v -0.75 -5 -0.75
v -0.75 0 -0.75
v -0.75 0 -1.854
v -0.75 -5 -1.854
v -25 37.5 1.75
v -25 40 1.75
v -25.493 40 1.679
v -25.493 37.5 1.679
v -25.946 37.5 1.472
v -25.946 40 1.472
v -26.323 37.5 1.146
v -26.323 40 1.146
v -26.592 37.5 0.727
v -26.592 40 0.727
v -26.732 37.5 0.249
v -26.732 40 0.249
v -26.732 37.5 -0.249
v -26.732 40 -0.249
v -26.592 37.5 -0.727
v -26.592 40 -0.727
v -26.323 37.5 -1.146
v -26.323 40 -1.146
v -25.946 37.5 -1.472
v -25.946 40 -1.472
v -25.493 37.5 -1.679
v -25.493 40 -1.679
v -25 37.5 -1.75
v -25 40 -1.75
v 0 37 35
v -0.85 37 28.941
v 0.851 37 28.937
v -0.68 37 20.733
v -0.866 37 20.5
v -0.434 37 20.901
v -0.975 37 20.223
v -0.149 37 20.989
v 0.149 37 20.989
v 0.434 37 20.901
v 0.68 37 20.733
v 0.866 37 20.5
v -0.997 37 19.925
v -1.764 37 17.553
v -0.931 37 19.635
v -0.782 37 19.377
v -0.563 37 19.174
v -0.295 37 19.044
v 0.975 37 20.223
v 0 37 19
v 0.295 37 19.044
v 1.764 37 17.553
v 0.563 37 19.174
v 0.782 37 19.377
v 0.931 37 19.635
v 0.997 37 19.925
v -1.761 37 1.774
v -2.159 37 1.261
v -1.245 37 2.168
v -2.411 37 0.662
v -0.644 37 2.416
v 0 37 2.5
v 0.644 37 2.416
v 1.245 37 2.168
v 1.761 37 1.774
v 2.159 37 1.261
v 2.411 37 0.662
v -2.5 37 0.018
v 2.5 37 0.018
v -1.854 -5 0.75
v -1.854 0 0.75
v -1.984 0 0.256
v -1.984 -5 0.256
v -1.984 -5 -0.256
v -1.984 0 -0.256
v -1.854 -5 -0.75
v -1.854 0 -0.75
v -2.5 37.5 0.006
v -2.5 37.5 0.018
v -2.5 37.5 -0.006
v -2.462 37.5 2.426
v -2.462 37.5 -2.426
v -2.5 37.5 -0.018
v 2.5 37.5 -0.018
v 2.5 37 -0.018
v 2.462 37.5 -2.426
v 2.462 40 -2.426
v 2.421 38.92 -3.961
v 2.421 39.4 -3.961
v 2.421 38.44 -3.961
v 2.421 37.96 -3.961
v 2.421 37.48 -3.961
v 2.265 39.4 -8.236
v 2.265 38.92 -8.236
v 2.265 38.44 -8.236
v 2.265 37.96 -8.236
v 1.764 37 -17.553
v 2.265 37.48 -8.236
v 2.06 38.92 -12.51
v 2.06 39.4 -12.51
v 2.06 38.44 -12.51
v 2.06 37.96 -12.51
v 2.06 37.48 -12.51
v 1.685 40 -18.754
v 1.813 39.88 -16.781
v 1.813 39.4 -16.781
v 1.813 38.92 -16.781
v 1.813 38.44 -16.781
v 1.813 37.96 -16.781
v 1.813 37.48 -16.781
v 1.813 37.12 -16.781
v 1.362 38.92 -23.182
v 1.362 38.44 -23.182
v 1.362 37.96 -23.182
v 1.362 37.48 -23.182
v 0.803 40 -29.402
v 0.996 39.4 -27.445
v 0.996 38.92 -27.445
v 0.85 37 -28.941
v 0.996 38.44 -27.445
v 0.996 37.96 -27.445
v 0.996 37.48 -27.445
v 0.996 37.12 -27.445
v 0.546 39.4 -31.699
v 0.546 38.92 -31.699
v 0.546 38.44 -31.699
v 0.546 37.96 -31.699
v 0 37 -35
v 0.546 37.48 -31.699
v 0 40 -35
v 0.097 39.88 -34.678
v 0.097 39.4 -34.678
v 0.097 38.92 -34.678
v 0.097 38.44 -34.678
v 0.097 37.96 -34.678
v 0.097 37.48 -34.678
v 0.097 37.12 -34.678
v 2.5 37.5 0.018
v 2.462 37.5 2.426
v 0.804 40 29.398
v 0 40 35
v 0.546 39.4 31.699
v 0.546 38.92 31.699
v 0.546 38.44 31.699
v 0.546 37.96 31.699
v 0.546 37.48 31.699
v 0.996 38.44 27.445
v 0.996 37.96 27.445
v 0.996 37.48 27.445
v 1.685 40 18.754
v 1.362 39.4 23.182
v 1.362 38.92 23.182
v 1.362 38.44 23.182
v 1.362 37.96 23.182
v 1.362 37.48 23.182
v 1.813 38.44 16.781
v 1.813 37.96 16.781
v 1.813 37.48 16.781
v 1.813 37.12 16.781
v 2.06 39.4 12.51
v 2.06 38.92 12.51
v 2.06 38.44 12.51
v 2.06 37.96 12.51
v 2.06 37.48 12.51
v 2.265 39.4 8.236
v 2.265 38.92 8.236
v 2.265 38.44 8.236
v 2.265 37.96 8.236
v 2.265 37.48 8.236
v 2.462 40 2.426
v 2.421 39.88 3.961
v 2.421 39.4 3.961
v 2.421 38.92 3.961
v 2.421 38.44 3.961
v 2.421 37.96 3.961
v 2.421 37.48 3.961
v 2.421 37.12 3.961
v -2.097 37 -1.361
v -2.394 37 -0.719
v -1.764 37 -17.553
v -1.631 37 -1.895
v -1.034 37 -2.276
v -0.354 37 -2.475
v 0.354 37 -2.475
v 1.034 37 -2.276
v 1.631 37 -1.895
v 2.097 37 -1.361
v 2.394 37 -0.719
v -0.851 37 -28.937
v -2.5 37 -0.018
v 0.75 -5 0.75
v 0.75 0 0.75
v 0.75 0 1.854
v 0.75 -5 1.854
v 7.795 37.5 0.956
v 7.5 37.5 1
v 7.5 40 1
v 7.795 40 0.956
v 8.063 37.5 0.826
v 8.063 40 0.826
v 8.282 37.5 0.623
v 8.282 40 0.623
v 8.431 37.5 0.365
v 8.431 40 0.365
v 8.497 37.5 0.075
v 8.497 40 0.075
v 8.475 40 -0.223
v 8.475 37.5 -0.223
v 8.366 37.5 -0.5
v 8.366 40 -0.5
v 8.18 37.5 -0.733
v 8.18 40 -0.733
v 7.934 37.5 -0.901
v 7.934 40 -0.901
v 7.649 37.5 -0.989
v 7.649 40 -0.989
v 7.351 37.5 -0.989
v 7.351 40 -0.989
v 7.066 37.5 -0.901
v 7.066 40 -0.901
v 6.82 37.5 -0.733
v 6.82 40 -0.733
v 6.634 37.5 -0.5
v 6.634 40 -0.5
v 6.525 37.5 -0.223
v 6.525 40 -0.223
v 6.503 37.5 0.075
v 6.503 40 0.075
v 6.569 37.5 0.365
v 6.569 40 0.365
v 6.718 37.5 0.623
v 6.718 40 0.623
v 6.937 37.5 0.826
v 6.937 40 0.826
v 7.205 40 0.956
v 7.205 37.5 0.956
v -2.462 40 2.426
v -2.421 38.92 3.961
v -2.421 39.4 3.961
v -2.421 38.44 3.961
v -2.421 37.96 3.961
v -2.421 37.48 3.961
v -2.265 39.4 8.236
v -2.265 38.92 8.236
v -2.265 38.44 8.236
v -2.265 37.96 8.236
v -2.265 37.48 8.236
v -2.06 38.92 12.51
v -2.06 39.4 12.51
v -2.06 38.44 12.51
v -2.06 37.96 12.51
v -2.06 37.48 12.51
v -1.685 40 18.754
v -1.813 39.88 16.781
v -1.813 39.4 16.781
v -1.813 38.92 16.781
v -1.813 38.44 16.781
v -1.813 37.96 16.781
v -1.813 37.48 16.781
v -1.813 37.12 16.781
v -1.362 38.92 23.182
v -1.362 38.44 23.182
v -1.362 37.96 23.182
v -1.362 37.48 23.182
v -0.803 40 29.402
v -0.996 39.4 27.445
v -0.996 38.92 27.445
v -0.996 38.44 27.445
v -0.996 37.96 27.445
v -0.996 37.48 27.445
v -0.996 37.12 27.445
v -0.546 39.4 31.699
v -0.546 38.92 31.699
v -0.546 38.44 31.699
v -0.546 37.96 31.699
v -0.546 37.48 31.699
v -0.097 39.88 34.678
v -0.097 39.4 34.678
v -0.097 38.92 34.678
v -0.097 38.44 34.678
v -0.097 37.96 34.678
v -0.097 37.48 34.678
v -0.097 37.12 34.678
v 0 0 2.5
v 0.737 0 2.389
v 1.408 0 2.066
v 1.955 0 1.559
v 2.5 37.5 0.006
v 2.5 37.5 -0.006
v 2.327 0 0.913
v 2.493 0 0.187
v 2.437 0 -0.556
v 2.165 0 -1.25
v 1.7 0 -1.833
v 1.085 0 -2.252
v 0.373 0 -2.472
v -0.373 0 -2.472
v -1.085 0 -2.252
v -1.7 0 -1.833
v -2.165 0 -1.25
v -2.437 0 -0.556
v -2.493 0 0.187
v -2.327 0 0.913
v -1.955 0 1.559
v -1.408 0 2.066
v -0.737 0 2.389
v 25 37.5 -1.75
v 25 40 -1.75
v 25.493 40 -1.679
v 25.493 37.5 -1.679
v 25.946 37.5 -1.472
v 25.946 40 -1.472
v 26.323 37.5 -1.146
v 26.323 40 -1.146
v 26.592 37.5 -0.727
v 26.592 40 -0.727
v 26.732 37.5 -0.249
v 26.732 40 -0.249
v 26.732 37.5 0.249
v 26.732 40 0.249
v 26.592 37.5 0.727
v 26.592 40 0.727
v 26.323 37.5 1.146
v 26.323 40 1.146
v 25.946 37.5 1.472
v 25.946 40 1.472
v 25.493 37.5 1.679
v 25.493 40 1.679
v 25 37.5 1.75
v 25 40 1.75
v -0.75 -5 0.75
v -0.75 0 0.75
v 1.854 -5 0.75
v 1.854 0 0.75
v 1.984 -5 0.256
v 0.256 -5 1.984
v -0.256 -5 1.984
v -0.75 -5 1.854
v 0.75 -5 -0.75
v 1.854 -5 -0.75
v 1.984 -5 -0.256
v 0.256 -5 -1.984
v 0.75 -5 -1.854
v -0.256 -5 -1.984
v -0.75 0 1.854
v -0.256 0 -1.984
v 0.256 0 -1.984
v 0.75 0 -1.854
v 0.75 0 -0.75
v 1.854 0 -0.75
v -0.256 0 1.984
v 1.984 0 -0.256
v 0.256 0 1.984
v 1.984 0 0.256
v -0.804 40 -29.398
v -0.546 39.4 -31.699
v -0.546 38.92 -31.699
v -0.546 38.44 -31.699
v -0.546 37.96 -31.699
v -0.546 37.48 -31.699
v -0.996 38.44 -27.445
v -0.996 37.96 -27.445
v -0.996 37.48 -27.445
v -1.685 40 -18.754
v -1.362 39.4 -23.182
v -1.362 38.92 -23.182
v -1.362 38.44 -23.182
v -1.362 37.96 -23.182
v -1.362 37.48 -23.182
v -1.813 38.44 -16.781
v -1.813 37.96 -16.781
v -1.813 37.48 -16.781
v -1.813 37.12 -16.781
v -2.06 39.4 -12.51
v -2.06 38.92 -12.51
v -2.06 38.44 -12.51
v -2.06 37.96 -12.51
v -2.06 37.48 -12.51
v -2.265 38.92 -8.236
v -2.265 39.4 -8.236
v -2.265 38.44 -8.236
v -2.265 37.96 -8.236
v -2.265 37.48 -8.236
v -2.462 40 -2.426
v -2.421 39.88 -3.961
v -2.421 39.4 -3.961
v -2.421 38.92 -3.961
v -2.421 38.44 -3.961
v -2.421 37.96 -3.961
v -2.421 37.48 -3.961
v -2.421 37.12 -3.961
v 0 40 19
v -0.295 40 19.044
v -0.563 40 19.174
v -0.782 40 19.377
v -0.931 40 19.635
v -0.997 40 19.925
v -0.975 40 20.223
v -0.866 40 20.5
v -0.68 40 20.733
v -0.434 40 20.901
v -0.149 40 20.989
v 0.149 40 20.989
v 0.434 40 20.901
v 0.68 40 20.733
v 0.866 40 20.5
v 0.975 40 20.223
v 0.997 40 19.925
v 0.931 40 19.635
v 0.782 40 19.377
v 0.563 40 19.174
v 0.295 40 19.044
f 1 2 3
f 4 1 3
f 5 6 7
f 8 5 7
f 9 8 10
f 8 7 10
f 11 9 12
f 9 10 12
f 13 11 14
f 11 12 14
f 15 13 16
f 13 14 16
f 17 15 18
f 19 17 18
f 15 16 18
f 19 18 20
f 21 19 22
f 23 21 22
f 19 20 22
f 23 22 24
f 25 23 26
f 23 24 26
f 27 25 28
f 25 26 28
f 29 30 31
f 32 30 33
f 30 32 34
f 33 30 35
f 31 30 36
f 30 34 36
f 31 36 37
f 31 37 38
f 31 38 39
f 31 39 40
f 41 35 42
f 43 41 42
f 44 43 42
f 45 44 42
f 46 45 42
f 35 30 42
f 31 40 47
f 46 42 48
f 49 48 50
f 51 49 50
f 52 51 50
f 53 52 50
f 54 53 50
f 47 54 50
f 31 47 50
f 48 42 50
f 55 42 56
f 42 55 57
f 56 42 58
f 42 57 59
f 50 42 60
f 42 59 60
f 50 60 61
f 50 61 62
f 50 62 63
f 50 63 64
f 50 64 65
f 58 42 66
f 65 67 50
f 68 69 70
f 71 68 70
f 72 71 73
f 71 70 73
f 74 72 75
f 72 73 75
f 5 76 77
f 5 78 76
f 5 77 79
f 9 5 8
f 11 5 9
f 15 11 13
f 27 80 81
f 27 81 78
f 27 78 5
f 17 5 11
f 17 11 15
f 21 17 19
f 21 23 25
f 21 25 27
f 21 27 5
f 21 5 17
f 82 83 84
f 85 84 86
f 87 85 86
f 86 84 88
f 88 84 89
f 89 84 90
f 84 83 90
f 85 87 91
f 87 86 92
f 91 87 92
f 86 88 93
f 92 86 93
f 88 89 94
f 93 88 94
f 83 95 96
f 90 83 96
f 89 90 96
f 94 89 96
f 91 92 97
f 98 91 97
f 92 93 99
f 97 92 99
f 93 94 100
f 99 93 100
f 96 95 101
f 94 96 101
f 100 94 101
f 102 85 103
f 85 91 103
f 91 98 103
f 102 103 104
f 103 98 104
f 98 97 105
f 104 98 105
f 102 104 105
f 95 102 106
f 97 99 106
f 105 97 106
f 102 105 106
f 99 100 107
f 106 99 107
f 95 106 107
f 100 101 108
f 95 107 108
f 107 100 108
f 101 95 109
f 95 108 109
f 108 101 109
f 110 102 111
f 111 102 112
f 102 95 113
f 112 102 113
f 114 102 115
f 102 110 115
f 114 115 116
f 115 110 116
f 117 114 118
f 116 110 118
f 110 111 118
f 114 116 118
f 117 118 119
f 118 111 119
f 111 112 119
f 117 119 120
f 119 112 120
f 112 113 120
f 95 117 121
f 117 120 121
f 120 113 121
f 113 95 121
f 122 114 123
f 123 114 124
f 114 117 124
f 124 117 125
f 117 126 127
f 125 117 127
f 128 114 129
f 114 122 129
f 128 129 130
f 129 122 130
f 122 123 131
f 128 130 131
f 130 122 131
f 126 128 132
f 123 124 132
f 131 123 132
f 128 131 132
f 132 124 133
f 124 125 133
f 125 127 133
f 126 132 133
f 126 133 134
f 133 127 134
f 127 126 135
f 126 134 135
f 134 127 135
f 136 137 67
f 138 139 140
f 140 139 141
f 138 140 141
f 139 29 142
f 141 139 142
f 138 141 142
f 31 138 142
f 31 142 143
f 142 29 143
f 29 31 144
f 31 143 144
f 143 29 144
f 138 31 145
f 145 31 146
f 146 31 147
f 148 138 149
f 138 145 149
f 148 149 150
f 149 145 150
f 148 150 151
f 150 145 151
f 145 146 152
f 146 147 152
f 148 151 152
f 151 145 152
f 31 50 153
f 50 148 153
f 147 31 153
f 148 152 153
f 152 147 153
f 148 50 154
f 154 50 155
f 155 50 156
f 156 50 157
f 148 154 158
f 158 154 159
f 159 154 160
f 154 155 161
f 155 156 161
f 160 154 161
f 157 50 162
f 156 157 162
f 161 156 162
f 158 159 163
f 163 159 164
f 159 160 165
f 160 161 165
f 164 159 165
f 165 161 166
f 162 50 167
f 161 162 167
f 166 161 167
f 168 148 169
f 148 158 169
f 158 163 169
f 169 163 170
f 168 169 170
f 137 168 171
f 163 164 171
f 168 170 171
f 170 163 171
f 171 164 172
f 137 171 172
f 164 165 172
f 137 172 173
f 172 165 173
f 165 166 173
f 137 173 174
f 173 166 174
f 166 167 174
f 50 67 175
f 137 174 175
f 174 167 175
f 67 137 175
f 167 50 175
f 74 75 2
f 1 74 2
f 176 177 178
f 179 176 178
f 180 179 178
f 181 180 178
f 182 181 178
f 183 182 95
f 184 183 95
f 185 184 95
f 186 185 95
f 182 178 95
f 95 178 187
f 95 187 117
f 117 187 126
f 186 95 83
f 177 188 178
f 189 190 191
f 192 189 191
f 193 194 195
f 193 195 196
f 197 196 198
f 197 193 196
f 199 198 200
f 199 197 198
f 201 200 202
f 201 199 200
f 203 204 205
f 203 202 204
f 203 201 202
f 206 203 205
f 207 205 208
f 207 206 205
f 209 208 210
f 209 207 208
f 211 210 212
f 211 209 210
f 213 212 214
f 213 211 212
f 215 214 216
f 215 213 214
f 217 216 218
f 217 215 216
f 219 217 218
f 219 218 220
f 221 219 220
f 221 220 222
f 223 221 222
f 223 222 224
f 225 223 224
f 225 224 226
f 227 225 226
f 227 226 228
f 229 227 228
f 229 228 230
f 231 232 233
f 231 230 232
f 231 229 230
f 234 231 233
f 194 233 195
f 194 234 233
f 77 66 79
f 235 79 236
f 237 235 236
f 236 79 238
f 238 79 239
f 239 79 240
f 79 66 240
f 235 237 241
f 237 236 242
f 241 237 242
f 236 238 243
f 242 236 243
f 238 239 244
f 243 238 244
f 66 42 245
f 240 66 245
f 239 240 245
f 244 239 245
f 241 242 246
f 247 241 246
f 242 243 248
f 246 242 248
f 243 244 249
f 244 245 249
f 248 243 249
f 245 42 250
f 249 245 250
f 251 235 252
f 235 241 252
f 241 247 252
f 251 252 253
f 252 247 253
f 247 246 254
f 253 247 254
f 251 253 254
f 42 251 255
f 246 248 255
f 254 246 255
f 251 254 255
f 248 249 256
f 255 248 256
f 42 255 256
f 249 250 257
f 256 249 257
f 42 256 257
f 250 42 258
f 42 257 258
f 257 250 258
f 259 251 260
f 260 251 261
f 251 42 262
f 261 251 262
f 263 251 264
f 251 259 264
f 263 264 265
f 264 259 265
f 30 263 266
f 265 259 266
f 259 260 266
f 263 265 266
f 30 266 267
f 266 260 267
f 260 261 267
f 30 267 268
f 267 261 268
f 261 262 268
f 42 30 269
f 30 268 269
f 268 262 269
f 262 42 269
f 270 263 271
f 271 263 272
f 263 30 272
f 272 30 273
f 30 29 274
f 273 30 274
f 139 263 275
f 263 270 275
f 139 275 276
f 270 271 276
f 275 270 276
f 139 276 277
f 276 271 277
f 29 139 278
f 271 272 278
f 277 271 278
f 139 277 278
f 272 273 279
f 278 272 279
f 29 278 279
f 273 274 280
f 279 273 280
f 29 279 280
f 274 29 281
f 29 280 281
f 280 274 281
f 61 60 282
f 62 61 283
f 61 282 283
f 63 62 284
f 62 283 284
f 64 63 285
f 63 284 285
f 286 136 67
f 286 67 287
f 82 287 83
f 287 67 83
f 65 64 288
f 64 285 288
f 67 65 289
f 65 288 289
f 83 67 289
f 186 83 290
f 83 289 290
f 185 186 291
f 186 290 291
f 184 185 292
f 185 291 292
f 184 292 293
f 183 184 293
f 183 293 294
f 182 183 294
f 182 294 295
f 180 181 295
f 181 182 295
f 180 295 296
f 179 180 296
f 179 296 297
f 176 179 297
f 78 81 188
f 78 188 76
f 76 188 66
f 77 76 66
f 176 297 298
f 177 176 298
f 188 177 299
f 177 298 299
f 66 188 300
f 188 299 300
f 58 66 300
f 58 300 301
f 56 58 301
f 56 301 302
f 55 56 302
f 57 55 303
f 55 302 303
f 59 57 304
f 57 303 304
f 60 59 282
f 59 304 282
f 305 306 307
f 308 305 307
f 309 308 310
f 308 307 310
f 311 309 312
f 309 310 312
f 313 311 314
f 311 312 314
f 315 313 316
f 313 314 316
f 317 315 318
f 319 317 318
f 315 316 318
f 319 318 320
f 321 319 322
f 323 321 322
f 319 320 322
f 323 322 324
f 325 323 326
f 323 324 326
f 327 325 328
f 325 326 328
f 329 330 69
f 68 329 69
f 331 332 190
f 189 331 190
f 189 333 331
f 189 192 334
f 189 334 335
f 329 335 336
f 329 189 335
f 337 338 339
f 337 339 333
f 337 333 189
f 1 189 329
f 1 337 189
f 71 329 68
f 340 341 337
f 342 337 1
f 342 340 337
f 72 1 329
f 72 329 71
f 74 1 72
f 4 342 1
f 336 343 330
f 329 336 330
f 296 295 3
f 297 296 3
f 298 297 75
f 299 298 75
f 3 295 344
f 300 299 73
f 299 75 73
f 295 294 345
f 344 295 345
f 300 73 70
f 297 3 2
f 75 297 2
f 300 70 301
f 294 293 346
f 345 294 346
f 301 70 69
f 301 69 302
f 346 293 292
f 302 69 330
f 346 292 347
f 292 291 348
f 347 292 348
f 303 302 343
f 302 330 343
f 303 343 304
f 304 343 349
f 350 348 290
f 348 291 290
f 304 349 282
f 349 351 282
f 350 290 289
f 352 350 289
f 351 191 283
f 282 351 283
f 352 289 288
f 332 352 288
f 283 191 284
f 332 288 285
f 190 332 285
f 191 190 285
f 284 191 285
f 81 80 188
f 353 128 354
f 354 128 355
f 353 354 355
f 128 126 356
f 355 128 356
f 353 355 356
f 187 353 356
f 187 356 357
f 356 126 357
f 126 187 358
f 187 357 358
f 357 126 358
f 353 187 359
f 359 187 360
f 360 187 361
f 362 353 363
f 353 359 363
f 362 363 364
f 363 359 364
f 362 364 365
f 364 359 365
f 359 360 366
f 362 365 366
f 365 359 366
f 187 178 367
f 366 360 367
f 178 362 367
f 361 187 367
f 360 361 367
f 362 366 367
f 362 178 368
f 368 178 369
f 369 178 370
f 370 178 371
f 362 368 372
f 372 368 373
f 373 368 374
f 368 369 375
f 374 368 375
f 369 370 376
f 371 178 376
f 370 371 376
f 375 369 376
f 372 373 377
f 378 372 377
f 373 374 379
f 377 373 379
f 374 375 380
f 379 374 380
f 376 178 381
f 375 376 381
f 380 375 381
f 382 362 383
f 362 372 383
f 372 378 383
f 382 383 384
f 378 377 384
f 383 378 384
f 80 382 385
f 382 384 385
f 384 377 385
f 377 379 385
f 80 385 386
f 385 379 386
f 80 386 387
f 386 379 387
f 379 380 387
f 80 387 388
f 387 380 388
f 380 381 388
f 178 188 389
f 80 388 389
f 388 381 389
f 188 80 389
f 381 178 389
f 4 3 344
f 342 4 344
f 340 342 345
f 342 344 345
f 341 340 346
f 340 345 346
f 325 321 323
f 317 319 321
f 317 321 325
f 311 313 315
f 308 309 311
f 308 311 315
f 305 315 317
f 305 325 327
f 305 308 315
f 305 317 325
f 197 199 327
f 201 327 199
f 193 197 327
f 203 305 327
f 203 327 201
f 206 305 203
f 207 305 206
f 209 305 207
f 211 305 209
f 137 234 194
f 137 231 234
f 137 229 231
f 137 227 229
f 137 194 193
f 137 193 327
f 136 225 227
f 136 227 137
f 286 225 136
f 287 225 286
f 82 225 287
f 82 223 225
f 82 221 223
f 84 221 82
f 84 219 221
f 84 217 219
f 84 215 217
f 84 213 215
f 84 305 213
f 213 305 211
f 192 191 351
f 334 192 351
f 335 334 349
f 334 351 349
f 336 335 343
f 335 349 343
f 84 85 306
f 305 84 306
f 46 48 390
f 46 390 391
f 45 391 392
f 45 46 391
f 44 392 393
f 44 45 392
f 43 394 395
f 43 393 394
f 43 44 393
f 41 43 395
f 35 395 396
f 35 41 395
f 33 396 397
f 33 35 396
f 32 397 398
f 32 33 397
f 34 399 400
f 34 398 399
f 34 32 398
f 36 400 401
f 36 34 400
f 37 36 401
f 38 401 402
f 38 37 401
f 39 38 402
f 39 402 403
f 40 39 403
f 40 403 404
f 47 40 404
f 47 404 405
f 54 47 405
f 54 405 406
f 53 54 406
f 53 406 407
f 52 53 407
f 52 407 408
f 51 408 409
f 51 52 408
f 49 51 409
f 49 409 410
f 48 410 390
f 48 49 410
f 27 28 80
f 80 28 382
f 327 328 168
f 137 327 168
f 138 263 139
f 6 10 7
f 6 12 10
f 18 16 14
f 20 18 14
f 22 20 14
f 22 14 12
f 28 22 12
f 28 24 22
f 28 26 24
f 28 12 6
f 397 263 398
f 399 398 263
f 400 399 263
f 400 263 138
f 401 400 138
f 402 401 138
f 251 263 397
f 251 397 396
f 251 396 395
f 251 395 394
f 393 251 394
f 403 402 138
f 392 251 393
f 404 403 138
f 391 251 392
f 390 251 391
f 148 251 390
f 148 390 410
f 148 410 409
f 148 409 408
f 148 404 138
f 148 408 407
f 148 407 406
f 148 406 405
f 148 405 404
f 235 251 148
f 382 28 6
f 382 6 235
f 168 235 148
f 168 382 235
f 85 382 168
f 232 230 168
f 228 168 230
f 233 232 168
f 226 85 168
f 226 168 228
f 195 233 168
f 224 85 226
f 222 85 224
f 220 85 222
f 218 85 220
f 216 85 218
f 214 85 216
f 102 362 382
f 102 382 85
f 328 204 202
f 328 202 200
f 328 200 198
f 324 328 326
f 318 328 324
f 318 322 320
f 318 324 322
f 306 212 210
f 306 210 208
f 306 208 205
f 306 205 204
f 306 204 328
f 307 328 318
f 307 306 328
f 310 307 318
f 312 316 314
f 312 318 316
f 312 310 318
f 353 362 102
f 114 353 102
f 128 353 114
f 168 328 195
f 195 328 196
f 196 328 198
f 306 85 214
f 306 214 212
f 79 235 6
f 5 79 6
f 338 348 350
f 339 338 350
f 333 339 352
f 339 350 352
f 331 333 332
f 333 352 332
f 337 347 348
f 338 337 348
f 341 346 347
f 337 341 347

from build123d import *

# Parameters (mm, degrees)
SKETCH_1_R          = 2.5
EXTRUDE_1_DEPTH     = 40
EXTRUDE_2_DEPTH     = 5
EXTRUDE_START       = 40
EXTRUDE_3_DEPTH     = 2.5
SKETCH_4_R          = 1
CUT_EXTRUDE_1_DEPTH = 49.185189633
EXTRUDE_START_2     = 37
EXTRUDE_5_DEPTH     = 3
SKETCH_6_R          = 1
CUT_EXTRUDE_2_DEPTH = 60.502626163


# Read off the part's stored shape, not the designer's step: 凸台-拉伸5
with BuildPart() as part:
    # 草图1 → 凸台-拉伸1 (new body)
    with BuildSketch(Plane(origin=(0, 0, 0), x_dir=(1, 0, 0), z_dir=(0, 1, 0))):
        with Locations(Location((0, 0, 0), (0, 0, 270))):
            Circle(SKETCH_1_R)
    extrude(amount=EXTRUDE_1_DEPTH)

    # 草图2 → 凸台-拉伸2 (add)
    with BuildSketch(Plane(origin=(0, 0, 0), x_dir=(1, 0, 0), z_dir=(0, 1, 0))):
        with BuildLine():
            Line((-1.854049622, 0.75), (-0.75, 0.75))
            Line((-0.75, 0.75), (-0.75, 1.854049622))
            ThreePointArc((-0.75, 1.854049622), (0, 2), (0.75, 1.854049622))
            Line((0.75, 1.854049622), (0.75, 0.75))
            Line((0.75, 0.75), (1.854049622, 0.75))
            ThreePointArc((1.854049622, 0.75), (2, 0), (1.854049622, -0.75))
            Line((1.854049622, -0.75), (0.75, -0.75))
            Line((0.75, -0.75), (0.75, -1.854049622))
            ThreePointArc((0.75, -1.854049622), (0, -2), (-0.75, -1.854049622))
            Line((-0.75, -1.854049622), (-0.75, -0.75))
            Line((-0.75, -0.75), (-1.854049622, -0.75))
            ThreePointArc((-1.854049622, -0.75), (-2, 0), (-1.854049622, 0.75))
        make_face()
    extrude(amount=-EXTRUDE_2_DEPTH)

    # 草图3 → 凸台-拉伸3 (add)
    with BuildSketch(Plane(origin=(0, 0, 0), x_dir=(1, 0, 0), z_dir=(0, 1, 0)).offset(EXTRUDE_START)):
        with BuildLine():
            Line((-25, 1.75), (0, 2.5))
            Line((0, 2.5), (25, 1.75))
            ThreePointArc((25, 1.75), (26.75, 0), (25, -1.75))
            Line((25, -1.75), (0, -2.5))
            Line((0, -2.5), (-25, -1.75))
            ThreePointArc((-25, -1.75), (-26.75, 0), (-25, 1.75))
        make_face()
    extrude(amount=-EXTRUDE_3_DEPTH)

    # 草图4 → 切除-拉伸1 (cut, through all)
    with BuildSketch(Plane(origin=(0, 0, 0), x_dir=(1, 0, 0), z_dir=(0, 1, 0))):
        with Locations(Location((7.5, 0, 0), (0, 0, 270))):
            Circle(SKETCH_4_R)
    extrude(amount=CUT_EXTRUDE_1_DEPTH, mode=Mode.SUBTRACT)

    # 凸台-拉伸5 outline → 凸台-拉伸5 (add)
    with BuildSketch(Plane(origin=(0, 0, 0), x_dir=(1, 0, 0), z_dir=(0, 1, 0)).offset(EXTRUDE_START_2)):
        with BuildLine():
            add(Edge.make_bspline(
                [(2.499933423, 0.018245068), (2.498219386, 0.469363251), (2.484734316, 1.455192602), (2.451884064, 2.975538514), (2.389924718, 5.030093947), (2.311185682, 7.167783743), (2.21992006, 9.304977486), (2.117504763, 11.441661138), (2.004457826, 13.577810113), (1.850297461, 16.247283269), (1.678883113, 18.915719005), (1.489506552, 21.582946653), (1.279504124, 24.248615937), (1.097348525, 26.379992466), (0.89821468, 28.50986205), (0.694476446, 30.469111551), (0.501474971, 32.108411254), (0.335275975, 33.325545367), (0.216484884, 34.069691013), (0.139328591, 34.483174612), (0.092236202, 34.701503032), (0.063236689, 34.819144825), (0.045016629, 34.88495716), (0.032864766, 34.924107989), (0.023980122, 34.950624486), (0.015550639, 34.971928448), (0.009545374, 34.986982697), (0.003698819, 34.995890501), (0, 35)],
                knots=[0.000519485, 0.000519485, 0.000519485, 0.000519485, 0.000519485, 0.051897602, 0.112804134, 0.173710667, 0.2346172, 0.295523733, 0.356430266, 0.417336798, 0.478243331, 0.600056396, 0.660962928, 0.721869461, 0.782775993, 0.843682525, 0.904589058, 0.946207229, 0.970757176, 0.983579314, 0.990404585, 0.994106837, 0.996190511, 0.99737811, 0.9981787, 0.998778686, 0.999368421, 1, 1, 1, 1, 1], degree=4))
            add(Edge.make_bspline(
                [(0, 35), (-0.003698819, 34.995890501), (-0.009545374, 34.986982697), (-0.015550639, 34.971928448), (-0.023980122, 34.950624486), (-0.032864766, 34.924107989), (-0.045016629, 34.88495716), (-0.063236689, 34.819144825), (-0.092236202, 34.701503032), (-0.139328591, 34.483174612), (-0.216484884, 34.069691013), (-0.335275975, 33.325545367), (-0.501474971, 32.108411254), (-0.694476446, 30.469111551), (-0.89821468, 28.50986205), (-1.097348525, 26.379992466), (-1.279504125, 24.248615937), (-1.489506552, 21.582946653), (-1.678883113, 18.915719005), (-1.850297461, 16.247283269), (-2.004457826, 13.577810113), (-2.117504763, 11.441661138), (-2.21992006, 9.304977486), (-2.311185682, 7.167783743), (-2.389924718, 5.030093947), (-2.451884064, 2.975538513), (-2.484734316, 1.455192601), (-2.498219387, 0.46936325), (-2.499933423, 0.018245066)],
                knots=[0, 0, 0, 0, 0, 0.000631579, 0.001221314, 0.0018213, 0.00262189, 0.003809489, 0.005893163, 0.009595415, 0.016420686, 0.029242824, 0.053792771, 0.095410942, 0.156317475, 0.217224007, 0.278130539, 0.339037072, 0.399943604, 0.521756669, 0.582663202, 0.643569734, 0.704476267, 0.7653828, 0.826289333, 0.887195866, 0.948102398, 0.999480515, 0.999480515, 0.999480515, 0.999480515, 0.999480515], degree=4))
            ThreePointArc((-2.499933423, 0.018245066), (-1e-09, 2.5), (2.499933423, 0.018245068))
        make_face()
        with BuildLine():
            ThreePointArc((2.499933423, -0.018245068), (-1e-09, -2.5), (-2.499933423, -0.018245066))
            add(Edge.make_bspline(
                [(-2.499933423, -0.018245066), (-2.498219387, -0.46936325), (-2.484734316, -1.455192601), (-2.451884064, -2.975538513), (-2.389924718, -5.030093947), (-2.311185682, -7.167783743), (-2.21992006, -9.304977486), (-2.117504763, -11.441661138), (-2.004457826, -13.577810113), (-1.850297461, -16.247283269), (-1.678883113, -18.915719005), (-1.489506552, -21.582946653), (-1.279504125, -24.248615937), (-1.097348525, -26.379992466), (-0.89821468, -28.50986205), (-0.694476446, -30.469111551), (-0.501474971, -32.108411254), (-0.335275975, -33.325545367), (-0.216484884, -34.069691013), (-0.139328591, -34.483174612), (-0.092236202, -34.701503032), (-0.063236689, -34.819144825), (-0.045016629, -34.88495716), (-0.032864766, -34.924107989), (-0.023980122, -34.950624486), (-0.015550639, -34.971928448), (-0.009545374, -34.986982697), (-0.003698819, -34.995890501), (0, -35)],
                knots=[0.000519485, 0.000519485, 0.000519485, 0.000519485, 0.000519485, 0.051897602, 0.112804134, 0.173710667, 0.2346172, 0.295523733, 0.356430266, 0.417336798, 0.478243331, 0.600056396, 0.660962928, 0.721869461, 0.782775993, 0.843682525, 0.904589058, 0.946207229, 0.970757176, 0.983579314, 0.990404585, 0.994106837, 0.996190511, 0.99737811, 0.9981787, 0.998778686, 0.999368421, 1, 1, 1, 1, 1], degree=4))
            add(Edge.make_bspline(
                [(0, -35), (0.003698819, -34.995890501), (0.009545374, -34.986982697), (0.015550639, -34.971928448), (0.023980122, -34.950624486), (0.032864766, -34.924107989), (0.045016629, -34.88495716), (0.063236689, -34.819144825), (0.092236202, -34.701503032), (0.139328591, -34.483174612), (0.216484884, -34.069691013), (0.335275975, -33.325545367), (0.501474971, -32.108411254), (0.694476446, -30.469111551), (0.89821468, -28.50986205), (1.097348525, -26.379992466), (1.279504124, -24.248615937), (1.489506552, -21.582946653), (1.678883113, -18.915719005), (1.850297461, -16.247283269), (2.004457826, -13.577810113), (2.117504763, -11.441661138), (2.21992006, -9.304977486), (2.311185682, -7.167783743), (2.389924718, -5.030093947), (2.451884064, -2.975538514), (2.484734316, -1.455192602), (2.498219386, -0.469363251), (2.499933423, -0.018245068)],
                knots=[0, 0, 0, 0, 0, 0.000631579, 0.001221314, 0.0018213, 0.00262189, 0.003809489, 0.005893163, 0.009595415, 0.016420686, 0.029242824, 0.053792771, 0.095410942, 0.156317475, 0.217224007, 0.278130539, 0.339037072, 0.399943604, 0.521756669, 0.582663202, 0.643569734, 0.704476267, 0.7653828, 0.826289333, 0.887195866, 0.948102398, 0.999480515, 0.999480515, 0.999480515, 0.999480515, 0.999480515], degree=4))
        make_face()
    extrude(amount=EXTRUDE_5_DEPTH)

    # 草图6 → 切除-拉伸2 (cut, through all)
    with BuildSketch(Plane(origin=(0, 0, 0), x_dir=(1, 0, 0), z_dir=(0, 1, 0))):
        with Locations(Location((0, -20, 0), (0, 0, 90))):
            Circle(SKETCH_6_R)
    extrude(amount=CUT_EXTRUDE_2_DEPTH, mode=Mode.SUBTRACT)


solid = part.part
